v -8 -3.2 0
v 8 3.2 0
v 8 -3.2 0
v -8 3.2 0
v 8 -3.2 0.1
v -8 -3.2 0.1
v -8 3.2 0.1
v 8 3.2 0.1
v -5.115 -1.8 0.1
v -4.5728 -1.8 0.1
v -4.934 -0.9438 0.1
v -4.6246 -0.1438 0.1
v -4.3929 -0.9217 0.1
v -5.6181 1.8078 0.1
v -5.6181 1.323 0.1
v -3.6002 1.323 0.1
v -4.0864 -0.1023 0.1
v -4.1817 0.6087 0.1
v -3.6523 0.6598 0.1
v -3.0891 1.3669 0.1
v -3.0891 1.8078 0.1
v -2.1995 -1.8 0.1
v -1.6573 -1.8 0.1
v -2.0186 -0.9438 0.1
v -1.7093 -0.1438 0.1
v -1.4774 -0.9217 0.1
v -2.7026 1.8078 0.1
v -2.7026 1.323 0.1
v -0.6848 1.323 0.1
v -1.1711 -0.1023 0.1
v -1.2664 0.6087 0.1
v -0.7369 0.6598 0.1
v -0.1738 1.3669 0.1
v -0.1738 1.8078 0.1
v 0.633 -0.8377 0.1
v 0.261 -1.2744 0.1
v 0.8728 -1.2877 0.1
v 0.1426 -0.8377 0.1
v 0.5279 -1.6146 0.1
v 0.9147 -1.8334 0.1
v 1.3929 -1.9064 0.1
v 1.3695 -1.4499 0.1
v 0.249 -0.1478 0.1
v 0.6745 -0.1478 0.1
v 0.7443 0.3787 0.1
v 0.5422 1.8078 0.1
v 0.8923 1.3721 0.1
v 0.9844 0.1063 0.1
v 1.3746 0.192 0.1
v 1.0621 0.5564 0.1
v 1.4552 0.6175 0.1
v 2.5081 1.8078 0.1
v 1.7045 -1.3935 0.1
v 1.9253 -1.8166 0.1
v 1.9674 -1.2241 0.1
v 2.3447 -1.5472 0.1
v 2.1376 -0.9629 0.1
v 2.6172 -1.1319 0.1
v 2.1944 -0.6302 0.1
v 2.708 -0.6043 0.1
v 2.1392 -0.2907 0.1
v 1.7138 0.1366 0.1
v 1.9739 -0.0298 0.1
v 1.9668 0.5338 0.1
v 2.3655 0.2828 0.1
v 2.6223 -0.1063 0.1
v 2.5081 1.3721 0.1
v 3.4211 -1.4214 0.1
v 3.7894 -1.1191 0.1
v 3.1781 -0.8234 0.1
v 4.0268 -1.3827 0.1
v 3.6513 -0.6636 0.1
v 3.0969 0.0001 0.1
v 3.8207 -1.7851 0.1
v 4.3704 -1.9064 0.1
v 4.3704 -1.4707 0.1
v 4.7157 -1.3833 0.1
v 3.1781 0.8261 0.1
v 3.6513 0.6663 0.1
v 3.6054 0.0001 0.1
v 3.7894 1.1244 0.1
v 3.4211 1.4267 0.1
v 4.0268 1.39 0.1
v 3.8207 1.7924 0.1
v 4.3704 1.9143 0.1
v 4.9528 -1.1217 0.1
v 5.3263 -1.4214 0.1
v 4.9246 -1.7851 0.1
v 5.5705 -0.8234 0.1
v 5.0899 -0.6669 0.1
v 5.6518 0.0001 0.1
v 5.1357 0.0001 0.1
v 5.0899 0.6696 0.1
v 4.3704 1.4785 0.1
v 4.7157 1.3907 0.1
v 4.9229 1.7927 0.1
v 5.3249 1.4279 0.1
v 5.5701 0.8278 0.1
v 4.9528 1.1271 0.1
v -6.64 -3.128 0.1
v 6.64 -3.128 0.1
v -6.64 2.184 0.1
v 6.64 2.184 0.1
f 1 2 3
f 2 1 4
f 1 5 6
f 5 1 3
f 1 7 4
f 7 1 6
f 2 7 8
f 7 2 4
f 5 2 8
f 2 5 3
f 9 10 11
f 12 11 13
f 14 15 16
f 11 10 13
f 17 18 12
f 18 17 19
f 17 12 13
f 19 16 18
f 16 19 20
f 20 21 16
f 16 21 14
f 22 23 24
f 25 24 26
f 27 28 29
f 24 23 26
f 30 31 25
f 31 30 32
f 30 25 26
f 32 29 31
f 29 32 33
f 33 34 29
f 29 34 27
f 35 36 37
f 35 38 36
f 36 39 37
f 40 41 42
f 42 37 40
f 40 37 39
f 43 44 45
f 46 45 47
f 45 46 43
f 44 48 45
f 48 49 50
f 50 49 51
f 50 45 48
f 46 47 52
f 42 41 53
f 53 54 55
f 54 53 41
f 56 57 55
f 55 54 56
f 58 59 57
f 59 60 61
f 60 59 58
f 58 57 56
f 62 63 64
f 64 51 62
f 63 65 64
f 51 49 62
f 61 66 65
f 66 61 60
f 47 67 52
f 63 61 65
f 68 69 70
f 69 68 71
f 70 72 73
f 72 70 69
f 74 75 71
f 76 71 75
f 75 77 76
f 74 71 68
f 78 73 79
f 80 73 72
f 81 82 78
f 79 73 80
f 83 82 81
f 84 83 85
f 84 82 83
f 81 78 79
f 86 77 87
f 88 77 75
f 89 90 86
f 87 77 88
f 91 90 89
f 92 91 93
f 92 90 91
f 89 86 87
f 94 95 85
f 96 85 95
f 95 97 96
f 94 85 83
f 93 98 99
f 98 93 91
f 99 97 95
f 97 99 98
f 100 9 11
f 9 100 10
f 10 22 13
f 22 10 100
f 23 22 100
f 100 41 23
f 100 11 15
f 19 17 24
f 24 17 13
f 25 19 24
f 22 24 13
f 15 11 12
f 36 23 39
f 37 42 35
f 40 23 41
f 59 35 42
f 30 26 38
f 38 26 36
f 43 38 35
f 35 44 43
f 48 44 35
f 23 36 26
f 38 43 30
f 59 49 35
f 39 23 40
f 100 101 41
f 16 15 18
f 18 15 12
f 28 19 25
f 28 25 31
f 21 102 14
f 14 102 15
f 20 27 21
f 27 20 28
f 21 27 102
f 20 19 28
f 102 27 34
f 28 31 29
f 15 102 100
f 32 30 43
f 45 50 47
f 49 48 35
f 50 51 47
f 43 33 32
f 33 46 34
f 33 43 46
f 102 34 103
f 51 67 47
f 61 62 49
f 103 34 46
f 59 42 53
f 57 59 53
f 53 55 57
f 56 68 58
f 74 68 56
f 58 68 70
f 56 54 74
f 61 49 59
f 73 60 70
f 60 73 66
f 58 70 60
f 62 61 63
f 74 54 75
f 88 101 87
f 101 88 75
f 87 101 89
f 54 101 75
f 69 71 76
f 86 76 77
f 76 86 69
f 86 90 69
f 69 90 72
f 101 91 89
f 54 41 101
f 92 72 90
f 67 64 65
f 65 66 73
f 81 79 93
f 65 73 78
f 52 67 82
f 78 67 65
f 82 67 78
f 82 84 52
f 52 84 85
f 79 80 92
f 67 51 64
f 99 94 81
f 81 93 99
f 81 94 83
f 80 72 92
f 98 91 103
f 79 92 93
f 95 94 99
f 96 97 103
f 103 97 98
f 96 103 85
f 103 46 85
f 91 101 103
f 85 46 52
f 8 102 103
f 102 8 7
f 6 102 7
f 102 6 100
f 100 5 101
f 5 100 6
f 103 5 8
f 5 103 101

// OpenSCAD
// file: ../p/box5-12.scad
use <../lib.scad>
function ldraw_lib__box5_12() = [
// 0 Box with 5 Faces without Any Edges
// 0 Name: box5-12.dat
// 0 Author: Chris Dee [cwdee]
// 0 !LDRAW_ORG Primitive UPDATE 2009-02
// 0 !LICENSE Licensed under CC BY 2.0 and CC BY 4.0 : see CAreadme.txt
// 
// 0 BFC CERTIFY CCW
  [0,"BFC","CERTIFY"],
  [0,"BFC","CCW"],
// 
// 0 !HISTORY 2009-09-03 [PTadmin] Official Update 2009-02
// 
// 
// 4 16 1 1 1 1 1 -1 -1 1 -1 -1 1 1
  [4,16,1,1,1,1,1,-1,-1,1,-1,-1,1,1],
// 4 16 -1 0 1 1 0 1 1 1 1 -1 1 1
  [4,16,-1,0,1,1,0,1,1,1,1,-1,1,1],
// 4 16 -1 0 -1 -1 0 1 -1 1 1 -1 1 -1
  [4,16,-1,0,-1,-1,0,1,-1,1,1,-1,1,-1],
// 4 16 1 0 -1 -1 0 -1 -1 1 -1 1 1 -1
  [4,16,1,0,-1,-1,0,-1,-1,1,-1,1,1,-1],
// 4 16 1 0 1 1 0 -1 1 1 -1 1 1 1
  [4,16,1,0,1,1,0,-1,1,1,-1,1,1,1],
// 0
];
module ldraw_lib__box5_12(step=0, col=false, unit=2/5, alt=false, line=0.2, solid=!$preview)
    makepoly(ldraw_lib__box5_12(), step=step, col=col, unit=unit, alt=alt, line=line, solid=solid);
ldraw_lib__box5_12(line=0.2);
// main file
use <../lib.scad>
use <../p/box5-12.scad>
use <s/191925s01.scad>
function ldraw_lib__191925b() = [
// 0 Sticker  0.8 x  2 with White "7750"
// 0 Name: 191925b.dat
// 0 Author: Steffen [Steffen]
// 0 !LDRAW_ORG Part UPDATE 2012-01
// 0 !LICENSE Licensed under CC BY 2.0 and CC BY 4.0 : see CAreadme.txt
// 
// 0 BFC CERTIFY CCW
  [0,"BFC","CERTIFY"],
  [0,"BFC","CCW"],
// 
// 0 !HISTORY 2012-03-30 [PTadmin] Official Update 2012-01
// 
// 
// 1 16 0 -0.25 0 20 0 0 0 0.25 0 0 0 -8 box5-12.dat
  [1,16,0,-0.25,0,20,0,0,0,0.25,0,0,0,-8, ldraw_lib__box5_12()],
// 1 16 0 -0.25 -4.5 0.415 0 0 0 1 0 0 0 0.415 s\191925s01.dat
  [1,16,0,-0.25,-4.5,0.415,0,0,0,1,0,0,0,0.415, ldraw_lib__s__191925s01()],
// 4 16 -20 -0.25 8 -16.6 -0.25 5.46 16.6 -0.25 5.46 20 -0.25 8
  [4,16,-20,-0.25,8,-16.6,-0.25,5.46,16.6,-0.25,5.46,20,-0.25,8],
// 4 16 -16.6 -0.25 5.46 -20 -0.25 8 -20 -0.25 -8 -16.6 -0.25 -7.82
  [4,16,-16.6,-0.25,5.46,-20,-0.25,8,-20,-0.25,-8,-16.6,-0.25,-7.82],
// 4 16 -16.6 -0.25 -7.82 -20 -0.25 -8 20 -0.25 -8 16.6 -0.25 -7.82
  [4,16,-16.6,-0.25,-7.82,-20,-0.25,-8,20,-0.25,-8,16.6,-0.25,-7.82],
// 4 16 20 -0.25 8 16.6 -0.25 5.46 16.6 -0.25 -7.82 20 -0.25 -8
  [4,16,20,-0.25,8,16.6,-0.25,5.46,16.6,-0.25,-7.82,20,-0.25,-8],
// 0
];
module ldraw_lib__191925b(step=0, col=false, unit=2/5, alt=false, line=0.2, solid=!$preview)
    makepoly(ldraw_lib__191925b(), step=step, col=col, unit=unit, alt=alt, line=line, solid=solid);
ldraw_lib__191925b(line=0.2);
